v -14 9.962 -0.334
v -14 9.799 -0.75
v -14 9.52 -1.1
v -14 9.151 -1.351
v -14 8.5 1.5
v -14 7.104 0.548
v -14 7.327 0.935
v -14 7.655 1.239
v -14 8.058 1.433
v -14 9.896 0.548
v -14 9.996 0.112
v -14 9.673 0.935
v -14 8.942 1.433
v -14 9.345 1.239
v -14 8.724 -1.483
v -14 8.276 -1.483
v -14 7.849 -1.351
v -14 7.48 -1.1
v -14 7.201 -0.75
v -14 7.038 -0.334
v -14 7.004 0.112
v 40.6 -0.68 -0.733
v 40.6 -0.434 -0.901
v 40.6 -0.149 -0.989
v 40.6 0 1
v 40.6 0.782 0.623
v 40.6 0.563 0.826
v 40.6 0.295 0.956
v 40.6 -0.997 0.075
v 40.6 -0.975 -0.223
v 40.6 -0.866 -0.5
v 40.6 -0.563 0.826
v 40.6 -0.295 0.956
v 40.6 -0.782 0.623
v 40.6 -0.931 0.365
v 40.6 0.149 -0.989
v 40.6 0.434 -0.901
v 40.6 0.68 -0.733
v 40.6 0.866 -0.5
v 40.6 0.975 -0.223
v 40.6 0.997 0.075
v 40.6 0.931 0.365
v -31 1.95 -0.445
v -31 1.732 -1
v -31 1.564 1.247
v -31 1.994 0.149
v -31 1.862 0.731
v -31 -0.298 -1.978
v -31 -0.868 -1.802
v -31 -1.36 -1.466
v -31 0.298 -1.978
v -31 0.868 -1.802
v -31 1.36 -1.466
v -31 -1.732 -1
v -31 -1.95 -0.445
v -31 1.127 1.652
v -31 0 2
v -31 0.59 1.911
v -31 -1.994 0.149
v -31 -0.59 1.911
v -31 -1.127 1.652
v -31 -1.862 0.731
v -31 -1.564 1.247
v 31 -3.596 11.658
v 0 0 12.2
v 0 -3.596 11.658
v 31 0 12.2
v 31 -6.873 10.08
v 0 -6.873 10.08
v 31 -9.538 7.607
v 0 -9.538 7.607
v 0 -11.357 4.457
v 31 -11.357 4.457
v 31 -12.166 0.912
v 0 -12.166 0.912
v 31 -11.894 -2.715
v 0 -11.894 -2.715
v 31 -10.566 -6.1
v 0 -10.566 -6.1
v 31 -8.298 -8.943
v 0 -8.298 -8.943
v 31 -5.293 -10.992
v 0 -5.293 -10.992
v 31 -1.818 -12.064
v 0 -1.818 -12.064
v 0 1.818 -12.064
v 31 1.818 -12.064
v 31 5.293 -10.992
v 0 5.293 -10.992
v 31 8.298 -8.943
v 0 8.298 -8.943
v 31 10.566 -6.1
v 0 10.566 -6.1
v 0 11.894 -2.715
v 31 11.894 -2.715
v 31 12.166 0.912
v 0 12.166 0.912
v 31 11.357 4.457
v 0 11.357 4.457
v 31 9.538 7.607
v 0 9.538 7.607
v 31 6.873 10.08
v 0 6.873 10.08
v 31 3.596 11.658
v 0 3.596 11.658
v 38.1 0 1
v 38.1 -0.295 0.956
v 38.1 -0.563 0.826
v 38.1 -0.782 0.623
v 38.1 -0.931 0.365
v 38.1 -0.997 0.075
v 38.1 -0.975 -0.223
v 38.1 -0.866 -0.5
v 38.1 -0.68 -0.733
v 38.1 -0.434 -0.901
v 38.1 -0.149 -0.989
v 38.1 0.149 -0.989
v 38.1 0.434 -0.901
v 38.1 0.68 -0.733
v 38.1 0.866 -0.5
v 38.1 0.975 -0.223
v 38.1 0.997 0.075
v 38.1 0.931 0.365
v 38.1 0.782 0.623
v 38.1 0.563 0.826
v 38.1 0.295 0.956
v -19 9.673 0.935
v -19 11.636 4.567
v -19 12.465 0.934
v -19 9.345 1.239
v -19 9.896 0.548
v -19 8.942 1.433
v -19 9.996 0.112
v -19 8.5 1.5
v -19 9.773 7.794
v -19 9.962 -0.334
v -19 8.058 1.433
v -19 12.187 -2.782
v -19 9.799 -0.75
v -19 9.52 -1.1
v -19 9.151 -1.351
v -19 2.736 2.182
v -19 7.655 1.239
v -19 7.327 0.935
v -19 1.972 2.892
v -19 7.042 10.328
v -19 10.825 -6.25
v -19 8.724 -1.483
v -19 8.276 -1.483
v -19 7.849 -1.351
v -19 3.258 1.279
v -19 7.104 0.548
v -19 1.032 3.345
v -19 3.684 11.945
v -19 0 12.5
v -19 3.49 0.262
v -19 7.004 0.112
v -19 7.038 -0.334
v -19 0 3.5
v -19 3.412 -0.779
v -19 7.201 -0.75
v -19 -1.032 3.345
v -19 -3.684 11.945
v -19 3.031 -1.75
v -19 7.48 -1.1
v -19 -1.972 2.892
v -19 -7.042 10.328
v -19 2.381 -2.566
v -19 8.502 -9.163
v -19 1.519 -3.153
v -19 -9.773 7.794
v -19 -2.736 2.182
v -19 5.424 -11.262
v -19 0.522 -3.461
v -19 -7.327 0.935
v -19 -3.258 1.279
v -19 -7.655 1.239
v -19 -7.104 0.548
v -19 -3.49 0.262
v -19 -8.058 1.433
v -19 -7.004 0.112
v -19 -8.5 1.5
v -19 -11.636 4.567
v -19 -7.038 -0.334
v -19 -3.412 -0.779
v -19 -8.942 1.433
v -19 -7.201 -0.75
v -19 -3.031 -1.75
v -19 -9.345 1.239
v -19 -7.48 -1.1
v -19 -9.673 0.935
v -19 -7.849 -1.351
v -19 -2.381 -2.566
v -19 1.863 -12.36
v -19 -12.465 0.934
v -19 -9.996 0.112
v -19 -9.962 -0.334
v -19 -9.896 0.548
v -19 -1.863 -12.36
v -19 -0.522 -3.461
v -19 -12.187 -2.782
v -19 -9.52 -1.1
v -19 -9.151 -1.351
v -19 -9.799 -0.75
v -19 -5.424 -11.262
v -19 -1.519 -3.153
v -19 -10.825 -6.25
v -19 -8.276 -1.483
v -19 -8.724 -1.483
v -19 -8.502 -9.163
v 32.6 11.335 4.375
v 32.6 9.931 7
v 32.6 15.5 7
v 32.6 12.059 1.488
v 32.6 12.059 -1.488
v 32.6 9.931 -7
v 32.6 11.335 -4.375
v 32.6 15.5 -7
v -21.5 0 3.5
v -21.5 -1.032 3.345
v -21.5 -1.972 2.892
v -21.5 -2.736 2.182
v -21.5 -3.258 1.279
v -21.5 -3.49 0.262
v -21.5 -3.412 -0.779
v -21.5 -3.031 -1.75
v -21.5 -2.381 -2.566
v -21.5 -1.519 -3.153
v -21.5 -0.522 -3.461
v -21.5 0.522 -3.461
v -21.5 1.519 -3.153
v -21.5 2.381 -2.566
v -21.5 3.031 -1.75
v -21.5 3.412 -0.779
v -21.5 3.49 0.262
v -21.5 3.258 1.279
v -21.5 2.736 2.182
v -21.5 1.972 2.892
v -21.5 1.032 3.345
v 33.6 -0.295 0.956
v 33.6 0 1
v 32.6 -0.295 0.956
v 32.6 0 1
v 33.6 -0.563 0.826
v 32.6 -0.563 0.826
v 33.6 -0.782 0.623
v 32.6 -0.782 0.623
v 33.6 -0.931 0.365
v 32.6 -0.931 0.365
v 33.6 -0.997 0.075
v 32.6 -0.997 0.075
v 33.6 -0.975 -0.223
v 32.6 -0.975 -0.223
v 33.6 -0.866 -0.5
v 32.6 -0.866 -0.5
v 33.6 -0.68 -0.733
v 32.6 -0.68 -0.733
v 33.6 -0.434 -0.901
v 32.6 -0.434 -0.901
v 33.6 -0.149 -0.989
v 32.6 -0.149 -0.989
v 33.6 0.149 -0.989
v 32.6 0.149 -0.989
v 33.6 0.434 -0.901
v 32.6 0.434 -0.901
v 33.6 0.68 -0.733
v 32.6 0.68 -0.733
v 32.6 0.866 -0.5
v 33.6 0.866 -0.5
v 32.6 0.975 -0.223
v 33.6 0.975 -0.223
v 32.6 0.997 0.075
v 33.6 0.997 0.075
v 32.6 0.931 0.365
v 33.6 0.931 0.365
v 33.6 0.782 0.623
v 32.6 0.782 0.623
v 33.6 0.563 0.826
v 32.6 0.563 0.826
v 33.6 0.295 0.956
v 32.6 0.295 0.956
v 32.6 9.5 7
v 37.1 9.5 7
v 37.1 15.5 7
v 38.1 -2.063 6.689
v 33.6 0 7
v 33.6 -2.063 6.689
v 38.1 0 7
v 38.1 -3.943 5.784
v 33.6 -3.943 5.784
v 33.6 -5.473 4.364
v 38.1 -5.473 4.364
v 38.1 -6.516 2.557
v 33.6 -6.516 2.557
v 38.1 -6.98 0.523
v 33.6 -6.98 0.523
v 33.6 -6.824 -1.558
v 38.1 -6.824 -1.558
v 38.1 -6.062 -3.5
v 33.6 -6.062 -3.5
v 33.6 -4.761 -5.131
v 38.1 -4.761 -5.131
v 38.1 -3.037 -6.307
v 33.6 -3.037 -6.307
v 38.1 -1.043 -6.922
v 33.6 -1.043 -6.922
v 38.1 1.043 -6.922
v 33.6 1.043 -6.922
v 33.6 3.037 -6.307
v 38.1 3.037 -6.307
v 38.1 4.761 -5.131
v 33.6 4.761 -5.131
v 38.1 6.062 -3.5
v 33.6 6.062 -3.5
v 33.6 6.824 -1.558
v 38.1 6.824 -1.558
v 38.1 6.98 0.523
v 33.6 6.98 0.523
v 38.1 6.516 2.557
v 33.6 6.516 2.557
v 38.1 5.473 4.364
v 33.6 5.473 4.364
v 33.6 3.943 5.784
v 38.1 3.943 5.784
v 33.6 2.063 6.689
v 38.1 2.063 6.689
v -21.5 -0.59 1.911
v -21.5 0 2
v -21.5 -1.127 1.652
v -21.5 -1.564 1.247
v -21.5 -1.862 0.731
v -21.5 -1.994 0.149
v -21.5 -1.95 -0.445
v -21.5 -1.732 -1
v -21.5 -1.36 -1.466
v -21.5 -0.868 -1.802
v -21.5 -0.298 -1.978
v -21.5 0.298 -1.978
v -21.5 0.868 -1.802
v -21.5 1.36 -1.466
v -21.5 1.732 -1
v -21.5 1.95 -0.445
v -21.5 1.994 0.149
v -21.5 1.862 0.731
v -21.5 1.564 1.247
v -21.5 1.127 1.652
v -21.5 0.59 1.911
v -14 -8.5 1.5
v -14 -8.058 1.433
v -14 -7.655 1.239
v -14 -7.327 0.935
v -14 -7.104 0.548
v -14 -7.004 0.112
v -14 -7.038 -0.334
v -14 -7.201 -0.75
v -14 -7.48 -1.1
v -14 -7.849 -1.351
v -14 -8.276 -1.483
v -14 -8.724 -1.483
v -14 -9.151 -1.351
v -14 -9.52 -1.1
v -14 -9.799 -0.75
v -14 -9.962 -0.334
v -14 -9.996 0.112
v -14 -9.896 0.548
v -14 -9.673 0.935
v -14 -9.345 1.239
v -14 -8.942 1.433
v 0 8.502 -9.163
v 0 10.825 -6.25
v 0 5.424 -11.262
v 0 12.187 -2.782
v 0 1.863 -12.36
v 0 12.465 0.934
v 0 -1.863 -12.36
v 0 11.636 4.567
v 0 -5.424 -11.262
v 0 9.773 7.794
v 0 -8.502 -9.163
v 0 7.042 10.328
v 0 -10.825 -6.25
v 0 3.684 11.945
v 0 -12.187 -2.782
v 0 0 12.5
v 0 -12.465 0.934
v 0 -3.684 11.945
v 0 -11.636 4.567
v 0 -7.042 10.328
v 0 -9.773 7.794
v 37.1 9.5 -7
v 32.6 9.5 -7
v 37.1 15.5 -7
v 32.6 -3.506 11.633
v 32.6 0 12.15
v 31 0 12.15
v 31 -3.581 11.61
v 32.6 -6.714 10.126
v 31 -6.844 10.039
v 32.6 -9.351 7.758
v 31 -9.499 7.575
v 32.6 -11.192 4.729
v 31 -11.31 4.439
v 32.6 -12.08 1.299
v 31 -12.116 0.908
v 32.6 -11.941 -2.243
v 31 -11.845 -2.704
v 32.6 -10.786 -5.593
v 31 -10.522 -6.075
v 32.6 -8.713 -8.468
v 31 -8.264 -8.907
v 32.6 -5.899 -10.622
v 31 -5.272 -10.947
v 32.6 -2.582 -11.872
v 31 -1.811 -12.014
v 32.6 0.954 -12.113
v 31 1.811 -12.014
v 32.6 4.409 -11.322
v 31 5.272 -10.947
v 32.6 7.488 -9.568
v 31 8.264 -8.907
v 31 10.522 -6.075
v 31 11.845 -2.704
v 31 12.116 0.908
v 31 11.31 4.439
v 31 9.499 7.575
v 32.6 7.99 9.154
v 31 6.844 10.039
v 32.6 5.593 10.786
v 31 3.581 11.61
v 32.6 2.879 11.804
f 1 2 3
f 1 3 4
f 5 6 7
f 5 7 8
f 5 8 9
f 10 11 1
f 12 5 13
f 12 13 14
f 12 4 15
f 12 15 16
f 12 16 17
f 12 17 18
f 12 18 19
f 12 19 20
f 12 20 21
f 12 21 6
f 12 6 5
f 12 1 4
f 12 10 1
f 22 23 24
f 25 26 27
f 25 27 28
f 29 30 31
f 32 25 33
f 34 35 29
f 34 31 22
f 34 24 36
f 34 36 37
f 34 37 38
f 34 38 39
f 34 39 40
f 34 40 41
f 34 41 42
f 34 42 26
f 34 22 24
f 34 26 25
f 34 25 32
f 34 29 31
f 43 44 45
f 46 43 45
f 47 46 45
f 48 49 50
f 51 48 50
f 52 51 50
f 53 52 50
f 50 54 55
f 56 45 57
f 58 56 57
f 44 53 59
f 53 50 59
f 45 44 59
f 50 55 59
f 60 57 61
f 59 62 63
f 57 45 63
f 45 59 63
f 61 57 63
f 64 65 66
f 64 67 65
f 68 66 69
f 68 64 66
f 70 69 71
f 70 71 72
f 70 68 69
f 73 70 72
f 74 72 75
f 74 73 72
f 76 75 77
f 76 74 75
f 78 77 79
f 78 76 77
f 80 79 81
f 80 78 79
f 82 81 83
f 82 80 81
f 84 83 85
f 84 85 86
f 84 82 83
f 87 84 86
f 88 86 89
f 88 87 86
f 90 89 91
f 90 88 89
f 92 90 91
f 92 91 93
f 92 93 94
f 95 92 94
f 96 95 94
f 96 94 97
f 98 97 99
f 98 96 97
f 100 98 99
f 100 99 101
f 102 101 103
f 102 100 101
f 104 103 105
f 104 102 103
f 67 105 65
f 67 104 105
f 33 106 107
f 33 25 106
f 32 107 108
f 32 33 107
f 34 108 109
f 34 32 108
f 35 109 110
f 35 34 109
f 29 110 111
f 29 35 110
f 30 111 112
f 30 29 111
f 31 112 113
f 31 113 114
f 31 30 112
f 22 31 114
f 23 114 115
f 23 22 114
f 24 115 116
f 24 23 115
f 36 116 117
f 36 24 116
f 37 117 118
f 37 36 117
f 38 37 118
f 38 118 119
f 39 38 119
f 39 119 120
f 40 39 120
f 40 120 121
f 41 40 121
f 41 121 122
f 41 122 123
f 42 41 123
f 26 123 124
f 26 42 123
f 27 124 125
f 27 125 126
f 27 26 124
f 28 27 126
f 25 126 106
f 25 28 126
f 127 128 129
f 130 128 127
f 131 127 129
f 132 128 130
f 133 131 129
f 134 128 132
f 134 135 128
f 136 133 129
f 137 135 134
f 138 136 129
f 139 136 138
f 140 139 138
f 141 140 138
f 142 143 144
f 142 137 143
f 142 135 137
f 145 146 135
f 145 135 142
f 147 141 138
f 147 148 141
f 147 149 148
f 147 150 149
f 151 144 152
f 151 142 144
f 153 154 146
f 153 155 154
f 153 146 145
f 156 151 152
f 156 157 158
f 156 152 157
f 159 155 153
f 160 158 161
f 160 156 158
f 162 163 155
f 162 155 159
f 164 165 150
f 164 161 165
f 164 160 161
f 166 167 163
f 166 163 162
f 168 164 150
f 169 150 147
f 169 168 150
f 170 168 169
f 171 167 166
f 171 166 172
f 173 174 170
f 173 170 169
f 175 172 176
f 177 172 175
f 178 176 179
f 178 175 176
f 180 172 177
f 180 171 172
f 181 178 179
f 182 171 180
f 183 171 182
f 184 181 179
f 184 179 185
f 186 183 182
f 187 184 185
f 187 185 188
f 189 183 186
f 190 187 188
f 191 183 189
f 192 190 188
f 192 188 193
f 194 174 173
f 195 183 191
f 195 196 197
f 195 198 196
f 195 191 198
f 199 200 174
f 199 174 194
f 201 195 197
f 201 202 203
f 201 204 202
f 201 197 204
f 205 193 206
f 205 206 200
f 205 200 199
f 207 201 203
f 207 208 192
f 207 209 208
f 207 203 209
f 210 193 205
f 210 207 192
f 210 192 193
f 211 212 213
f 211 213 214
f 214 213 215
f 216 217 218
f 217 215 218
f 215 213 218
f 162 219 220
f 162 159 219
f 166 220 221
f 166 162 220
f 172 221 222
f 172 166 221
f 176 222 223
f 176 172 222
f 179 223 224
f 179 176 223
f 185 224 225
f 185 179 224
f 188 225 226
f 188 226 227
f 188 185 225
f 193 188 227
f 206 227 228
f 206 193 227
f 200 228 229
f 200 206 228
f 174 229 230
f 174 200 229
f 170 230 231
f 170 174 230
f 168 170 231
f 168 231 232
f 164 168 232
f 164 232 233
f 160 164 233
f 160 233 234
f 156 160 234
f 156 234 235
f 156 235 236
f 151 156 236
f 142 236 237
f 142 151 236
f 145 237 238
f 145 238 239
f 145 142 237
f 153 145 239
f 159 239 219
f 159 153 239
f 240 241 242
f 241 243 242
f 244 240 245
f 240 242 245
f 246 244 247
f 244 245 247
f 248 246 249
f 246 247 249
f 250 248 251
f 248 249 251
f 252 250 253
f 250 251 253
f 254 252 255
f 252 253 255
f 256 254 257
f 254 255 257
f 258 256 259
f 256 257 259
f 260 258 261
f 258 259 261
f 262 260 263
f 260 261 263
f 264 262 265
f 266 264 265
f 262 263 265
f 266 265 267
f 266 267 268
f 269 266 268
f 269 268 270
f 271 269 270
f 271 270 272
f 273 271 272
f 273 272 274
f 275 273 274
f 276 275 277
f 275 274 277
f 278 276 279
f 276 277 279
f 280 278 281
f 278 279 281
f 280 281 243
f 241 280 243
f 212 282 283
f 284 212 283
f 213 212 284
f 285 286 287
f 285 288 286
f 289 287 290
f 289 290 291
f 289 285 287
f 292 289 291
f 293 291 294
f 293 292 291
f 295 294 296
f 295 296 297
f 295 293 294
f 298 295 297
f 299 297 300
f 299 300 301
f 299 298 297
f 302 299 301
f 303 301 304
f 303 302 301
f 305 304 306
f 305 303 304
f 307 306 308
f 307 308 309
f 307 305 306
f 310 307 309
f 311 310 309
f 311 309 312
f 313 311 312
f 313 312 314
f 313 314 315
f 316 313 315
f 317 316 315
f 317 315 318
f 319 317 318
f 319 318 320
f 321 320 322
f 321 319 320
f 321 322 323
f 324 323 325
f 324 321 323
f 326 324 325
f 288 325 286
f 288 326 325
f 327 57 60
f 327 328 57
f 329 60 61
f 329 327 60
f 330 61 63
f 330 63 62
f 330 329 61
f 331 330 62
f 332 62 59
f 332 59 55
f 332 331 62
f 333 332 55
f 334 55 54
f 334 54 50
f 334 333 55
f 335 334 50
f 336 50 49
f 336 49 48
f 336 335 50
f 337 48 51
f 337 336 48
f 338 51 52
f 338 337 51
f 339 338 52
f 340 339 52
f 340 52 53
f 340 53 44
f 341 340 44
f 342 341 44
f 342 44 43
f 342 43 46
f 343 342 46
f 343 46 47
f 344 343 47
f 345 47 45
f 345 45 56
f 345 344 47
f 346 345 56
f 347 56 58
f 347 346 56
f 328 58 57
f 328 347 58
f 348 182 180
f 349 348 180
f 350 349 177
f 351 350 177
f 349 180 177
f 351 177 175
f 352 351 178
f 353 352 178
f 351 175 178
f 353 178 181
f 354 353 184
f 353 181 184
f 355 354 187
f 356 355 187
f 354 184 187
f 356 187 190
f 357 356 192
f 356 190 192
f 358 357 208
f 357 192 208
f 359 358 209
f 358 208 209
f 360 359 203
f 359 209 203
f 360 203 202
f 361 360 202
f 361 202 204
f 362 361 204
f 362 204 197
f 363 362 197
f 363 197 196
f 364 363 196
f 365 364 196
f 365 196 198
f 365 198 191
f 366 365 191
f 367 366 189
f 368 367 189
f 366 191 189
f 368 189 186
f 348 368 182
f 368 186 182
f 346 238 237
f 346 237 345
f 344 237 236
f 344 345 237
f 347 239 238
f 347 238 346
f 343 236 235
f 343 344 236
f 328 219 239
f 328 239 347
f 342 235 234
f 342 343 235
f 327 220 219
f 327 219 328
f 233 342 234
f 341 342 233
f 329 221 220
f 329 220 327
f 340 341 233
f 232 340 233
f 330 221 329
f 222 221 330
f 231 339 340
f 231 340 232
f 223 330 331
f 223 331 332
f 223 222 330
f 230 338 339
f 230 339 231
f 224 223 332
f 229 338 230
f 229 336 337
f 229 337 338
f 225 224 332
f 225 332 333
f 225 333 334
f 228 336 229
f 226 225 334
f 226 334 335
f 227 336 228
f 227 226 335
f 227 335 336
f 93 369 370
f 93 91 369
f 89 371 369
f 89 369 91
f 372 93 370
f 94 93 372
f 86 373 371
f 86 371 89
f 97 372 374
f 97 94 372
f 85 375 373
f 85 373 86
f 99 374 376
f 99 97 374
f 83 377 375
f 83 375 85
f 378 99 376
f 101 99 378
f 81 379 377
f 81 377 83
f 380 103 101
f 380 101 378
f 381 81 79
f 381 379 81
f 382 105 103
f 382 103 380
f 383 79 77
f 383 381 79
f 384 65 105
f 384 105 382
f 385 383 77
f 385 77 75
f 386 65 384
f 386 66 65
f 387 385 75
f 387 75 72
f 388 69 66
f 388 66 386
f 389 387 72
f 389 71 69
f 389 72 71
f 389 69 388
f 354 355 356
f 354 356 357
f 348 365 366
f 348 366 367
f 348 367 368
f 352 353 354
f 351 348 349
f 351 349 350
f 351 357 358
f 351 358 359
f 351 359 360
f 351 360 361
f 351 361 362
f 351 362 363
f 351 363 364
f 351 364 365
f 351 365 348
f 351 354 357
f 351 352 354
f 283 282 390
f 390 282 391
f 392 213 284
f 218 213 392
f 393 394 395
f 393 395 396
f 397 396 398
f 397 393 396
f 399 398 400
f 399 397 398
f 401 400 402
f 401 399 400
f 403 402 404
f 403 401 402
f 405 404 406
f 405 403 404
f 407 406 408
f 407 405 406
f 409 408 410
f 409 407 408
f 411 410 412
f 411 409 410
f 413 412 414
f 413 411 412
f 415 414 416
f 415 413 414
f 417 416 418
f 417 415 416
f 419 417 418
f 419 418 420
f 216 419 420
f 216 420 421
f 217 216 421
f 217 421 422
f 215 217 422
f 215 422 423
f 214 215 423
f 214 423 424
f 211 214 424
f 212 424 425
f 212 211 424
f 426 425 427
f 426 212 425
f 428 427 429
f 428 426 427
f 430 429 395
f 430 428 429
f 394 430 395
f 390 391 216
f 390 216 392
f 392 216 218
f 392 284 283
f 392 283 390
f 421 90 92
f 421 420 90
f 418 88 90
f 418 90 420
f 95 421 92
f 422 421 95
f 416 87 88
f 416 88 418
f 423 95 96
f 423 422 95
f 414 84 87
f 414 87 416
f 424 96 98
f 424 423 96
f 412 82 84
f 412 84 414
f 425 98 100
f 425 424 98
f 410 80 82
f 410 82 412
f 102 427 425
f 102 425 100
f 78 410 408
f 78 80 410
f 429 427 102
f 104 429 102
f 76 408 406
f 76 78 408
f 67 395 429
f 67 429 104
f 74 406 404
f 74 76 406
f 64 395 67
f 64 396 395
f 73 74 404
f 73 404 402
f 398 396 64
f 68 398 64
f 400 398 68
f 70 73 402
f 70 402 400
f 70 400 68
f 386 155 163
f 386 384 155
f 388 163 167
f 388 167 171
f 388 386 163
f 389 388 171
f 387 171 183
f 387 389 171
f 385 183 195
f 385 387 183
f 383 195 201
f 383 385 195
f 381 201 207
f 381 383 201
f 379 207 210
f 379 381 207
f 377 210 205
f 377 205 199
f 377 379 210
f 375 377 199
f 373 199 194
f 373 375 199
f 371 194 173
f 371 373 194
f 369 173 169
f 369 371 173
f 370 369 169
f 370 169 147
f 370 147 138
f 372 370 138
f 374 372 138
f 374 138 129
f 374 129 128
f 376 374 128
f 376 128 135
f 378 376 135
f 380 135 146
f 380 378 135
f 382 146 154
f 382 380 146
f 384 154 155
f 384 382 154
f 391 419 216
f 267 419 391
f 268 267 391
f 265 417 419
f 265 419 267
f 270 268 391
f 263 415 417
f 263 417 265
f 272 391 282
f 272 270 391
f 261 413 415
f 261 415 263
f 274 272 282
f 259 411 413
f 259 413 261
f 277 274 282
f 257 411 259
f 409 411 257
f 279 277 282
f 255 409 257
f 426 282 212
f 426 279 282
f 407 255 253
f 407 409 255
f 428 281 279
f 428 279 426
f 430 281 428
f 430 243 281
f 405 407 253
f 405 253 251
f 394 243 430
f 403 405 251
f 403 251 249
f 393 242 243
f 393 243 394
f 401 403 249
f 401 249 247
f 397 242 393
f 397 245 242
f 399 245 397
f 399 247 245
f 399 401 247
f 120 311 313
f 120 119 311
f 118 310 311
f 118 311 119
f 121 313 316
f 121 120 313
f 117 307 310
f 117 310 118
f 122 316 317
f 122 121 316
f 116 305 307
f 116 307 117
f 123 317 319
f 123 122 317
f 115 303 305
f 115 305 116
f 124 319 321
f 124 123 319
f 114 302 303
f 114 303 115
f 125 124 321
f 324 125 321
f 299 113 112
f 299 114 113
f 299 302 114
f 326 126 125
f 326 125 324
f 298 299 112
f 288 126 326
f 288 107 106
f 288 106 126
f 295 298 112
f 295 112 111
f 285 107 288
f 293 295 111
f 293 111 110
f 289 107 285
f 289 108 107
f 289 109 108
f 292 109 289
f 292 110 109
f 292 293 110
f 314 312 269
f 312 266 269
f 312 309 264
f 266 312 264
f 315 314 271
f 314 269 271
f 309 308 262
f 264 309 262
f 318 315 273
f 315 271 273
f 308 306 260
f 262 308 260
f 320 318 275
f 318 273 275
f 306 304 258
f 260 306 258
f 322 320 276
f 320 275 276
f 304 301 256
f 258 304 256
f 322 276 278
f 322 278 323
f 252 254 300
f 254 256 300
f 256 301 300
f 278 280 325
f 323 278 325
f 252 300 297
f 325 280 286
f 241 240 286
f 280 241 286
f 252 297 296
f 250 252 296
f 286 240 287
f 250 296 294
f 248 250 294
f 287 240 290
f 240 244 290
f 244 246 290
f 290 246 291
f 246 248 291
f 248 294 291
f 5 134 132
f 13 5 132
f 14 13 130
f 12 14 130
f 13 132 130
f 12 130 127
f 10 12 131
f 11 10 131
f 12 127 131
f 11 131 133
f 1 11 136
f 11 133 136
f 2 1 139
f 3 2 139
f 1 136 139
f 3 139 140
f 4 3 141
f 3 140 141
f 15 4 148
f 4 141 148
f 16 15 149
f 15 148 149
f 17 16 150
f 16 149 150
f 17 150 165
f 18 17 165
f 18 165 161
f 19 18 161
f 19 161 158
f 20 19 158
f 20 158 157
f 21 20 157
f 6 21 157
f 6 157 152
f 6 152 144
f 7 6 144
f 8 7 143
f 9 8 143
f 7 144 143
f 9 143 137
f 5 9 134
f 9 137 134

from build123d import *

# Parameters (mm, degrees)
SKETCH_4_R          = 1.5
CUT_EXTRUDE_1_DEPTH = 5
SKETCH_5_W          = 14
SKETCH_5_H          = 6
EXTRUDE_1_DEPTH     = 4.5


with BuildPart() as part:
    # ｽｹｯﾁ3 → 回転1 (revolve)
    with BuildSketch(Plane(origin=(0, 0, 0), x_dir=(1, 0, 0), z_dir=(0, 1, 0))):
        with BuildLine():
            Line((-31, 0), (-31, -2))
            Line((-31, -2), (-21.5, -2))
            Line((-21.5, -2), (-21.5, -3.5))
            Line((-21.5, -3.5), (-19, -3.5))
            Line((-19, -3.5), (-19, -12.5))
            Line((-19, -12.5), (0, -12.5))
            Line((0, -12.5), (0, -12.2))
            Line((0, -12.2), (31, -12.2))
            Line((31, -12.2), (31, -12.15))
            Line((31, -12.15), (32.6, -12.15))
            Line((32.6, -12.15), (32.6, -1))
            add(Edge.make_bspline(
                [(33.6, -1), (33.266666667, -1), (32.933333333, -1), (32.6, -1)],
                knots=[0, 0, 0, 0, 1, 1, 1, 1], degree=3))
            Line((33.6, -1), (33.6, -7))
            Line((33.6, -7), (38.1, -7))
            Line((38.1, -7), (38.1, -1))
            Line((38.1, -1), (40.6, -1))
            Line((40.6, -1), (40.6, 0))
            Line((40.6, 0), (-31, 0))
        make_face()
    revolve(axis=Axis((-48.769222311, 0, 0), (1, 0, 0)))

    # ｽｹｯﾁ4 → ｶｯﾄ - 押し出し1 (cut)
    with BuildSketch(Plane.ZY.offset(19)):
        with Locations((0, 8.5)):
            Circle(SKETCH_4_R)
        with Locations((0, -8.5)):
            Circle(SKETCH_4_R)
    extrude(amount=-CUT_EXTRUDE_1_DEPTH, mode=Mode.SUBTRACT)

    # ｽｹｯﾁ5 → ﾎﾞｽ - 押し出し1 (add)
    with BuildSketch(Plane(origin=(32.6, 0, 0), x_dir=(0, 0, -1), z_dir=(1, 0, 0))):
        with Locations((0, 12.5)):
            Rectangle(SKETCH_5_W, SKETCH_5_H)
    extrude(amount=EXTRUDE_1_DEPTH)


solid = part.part
